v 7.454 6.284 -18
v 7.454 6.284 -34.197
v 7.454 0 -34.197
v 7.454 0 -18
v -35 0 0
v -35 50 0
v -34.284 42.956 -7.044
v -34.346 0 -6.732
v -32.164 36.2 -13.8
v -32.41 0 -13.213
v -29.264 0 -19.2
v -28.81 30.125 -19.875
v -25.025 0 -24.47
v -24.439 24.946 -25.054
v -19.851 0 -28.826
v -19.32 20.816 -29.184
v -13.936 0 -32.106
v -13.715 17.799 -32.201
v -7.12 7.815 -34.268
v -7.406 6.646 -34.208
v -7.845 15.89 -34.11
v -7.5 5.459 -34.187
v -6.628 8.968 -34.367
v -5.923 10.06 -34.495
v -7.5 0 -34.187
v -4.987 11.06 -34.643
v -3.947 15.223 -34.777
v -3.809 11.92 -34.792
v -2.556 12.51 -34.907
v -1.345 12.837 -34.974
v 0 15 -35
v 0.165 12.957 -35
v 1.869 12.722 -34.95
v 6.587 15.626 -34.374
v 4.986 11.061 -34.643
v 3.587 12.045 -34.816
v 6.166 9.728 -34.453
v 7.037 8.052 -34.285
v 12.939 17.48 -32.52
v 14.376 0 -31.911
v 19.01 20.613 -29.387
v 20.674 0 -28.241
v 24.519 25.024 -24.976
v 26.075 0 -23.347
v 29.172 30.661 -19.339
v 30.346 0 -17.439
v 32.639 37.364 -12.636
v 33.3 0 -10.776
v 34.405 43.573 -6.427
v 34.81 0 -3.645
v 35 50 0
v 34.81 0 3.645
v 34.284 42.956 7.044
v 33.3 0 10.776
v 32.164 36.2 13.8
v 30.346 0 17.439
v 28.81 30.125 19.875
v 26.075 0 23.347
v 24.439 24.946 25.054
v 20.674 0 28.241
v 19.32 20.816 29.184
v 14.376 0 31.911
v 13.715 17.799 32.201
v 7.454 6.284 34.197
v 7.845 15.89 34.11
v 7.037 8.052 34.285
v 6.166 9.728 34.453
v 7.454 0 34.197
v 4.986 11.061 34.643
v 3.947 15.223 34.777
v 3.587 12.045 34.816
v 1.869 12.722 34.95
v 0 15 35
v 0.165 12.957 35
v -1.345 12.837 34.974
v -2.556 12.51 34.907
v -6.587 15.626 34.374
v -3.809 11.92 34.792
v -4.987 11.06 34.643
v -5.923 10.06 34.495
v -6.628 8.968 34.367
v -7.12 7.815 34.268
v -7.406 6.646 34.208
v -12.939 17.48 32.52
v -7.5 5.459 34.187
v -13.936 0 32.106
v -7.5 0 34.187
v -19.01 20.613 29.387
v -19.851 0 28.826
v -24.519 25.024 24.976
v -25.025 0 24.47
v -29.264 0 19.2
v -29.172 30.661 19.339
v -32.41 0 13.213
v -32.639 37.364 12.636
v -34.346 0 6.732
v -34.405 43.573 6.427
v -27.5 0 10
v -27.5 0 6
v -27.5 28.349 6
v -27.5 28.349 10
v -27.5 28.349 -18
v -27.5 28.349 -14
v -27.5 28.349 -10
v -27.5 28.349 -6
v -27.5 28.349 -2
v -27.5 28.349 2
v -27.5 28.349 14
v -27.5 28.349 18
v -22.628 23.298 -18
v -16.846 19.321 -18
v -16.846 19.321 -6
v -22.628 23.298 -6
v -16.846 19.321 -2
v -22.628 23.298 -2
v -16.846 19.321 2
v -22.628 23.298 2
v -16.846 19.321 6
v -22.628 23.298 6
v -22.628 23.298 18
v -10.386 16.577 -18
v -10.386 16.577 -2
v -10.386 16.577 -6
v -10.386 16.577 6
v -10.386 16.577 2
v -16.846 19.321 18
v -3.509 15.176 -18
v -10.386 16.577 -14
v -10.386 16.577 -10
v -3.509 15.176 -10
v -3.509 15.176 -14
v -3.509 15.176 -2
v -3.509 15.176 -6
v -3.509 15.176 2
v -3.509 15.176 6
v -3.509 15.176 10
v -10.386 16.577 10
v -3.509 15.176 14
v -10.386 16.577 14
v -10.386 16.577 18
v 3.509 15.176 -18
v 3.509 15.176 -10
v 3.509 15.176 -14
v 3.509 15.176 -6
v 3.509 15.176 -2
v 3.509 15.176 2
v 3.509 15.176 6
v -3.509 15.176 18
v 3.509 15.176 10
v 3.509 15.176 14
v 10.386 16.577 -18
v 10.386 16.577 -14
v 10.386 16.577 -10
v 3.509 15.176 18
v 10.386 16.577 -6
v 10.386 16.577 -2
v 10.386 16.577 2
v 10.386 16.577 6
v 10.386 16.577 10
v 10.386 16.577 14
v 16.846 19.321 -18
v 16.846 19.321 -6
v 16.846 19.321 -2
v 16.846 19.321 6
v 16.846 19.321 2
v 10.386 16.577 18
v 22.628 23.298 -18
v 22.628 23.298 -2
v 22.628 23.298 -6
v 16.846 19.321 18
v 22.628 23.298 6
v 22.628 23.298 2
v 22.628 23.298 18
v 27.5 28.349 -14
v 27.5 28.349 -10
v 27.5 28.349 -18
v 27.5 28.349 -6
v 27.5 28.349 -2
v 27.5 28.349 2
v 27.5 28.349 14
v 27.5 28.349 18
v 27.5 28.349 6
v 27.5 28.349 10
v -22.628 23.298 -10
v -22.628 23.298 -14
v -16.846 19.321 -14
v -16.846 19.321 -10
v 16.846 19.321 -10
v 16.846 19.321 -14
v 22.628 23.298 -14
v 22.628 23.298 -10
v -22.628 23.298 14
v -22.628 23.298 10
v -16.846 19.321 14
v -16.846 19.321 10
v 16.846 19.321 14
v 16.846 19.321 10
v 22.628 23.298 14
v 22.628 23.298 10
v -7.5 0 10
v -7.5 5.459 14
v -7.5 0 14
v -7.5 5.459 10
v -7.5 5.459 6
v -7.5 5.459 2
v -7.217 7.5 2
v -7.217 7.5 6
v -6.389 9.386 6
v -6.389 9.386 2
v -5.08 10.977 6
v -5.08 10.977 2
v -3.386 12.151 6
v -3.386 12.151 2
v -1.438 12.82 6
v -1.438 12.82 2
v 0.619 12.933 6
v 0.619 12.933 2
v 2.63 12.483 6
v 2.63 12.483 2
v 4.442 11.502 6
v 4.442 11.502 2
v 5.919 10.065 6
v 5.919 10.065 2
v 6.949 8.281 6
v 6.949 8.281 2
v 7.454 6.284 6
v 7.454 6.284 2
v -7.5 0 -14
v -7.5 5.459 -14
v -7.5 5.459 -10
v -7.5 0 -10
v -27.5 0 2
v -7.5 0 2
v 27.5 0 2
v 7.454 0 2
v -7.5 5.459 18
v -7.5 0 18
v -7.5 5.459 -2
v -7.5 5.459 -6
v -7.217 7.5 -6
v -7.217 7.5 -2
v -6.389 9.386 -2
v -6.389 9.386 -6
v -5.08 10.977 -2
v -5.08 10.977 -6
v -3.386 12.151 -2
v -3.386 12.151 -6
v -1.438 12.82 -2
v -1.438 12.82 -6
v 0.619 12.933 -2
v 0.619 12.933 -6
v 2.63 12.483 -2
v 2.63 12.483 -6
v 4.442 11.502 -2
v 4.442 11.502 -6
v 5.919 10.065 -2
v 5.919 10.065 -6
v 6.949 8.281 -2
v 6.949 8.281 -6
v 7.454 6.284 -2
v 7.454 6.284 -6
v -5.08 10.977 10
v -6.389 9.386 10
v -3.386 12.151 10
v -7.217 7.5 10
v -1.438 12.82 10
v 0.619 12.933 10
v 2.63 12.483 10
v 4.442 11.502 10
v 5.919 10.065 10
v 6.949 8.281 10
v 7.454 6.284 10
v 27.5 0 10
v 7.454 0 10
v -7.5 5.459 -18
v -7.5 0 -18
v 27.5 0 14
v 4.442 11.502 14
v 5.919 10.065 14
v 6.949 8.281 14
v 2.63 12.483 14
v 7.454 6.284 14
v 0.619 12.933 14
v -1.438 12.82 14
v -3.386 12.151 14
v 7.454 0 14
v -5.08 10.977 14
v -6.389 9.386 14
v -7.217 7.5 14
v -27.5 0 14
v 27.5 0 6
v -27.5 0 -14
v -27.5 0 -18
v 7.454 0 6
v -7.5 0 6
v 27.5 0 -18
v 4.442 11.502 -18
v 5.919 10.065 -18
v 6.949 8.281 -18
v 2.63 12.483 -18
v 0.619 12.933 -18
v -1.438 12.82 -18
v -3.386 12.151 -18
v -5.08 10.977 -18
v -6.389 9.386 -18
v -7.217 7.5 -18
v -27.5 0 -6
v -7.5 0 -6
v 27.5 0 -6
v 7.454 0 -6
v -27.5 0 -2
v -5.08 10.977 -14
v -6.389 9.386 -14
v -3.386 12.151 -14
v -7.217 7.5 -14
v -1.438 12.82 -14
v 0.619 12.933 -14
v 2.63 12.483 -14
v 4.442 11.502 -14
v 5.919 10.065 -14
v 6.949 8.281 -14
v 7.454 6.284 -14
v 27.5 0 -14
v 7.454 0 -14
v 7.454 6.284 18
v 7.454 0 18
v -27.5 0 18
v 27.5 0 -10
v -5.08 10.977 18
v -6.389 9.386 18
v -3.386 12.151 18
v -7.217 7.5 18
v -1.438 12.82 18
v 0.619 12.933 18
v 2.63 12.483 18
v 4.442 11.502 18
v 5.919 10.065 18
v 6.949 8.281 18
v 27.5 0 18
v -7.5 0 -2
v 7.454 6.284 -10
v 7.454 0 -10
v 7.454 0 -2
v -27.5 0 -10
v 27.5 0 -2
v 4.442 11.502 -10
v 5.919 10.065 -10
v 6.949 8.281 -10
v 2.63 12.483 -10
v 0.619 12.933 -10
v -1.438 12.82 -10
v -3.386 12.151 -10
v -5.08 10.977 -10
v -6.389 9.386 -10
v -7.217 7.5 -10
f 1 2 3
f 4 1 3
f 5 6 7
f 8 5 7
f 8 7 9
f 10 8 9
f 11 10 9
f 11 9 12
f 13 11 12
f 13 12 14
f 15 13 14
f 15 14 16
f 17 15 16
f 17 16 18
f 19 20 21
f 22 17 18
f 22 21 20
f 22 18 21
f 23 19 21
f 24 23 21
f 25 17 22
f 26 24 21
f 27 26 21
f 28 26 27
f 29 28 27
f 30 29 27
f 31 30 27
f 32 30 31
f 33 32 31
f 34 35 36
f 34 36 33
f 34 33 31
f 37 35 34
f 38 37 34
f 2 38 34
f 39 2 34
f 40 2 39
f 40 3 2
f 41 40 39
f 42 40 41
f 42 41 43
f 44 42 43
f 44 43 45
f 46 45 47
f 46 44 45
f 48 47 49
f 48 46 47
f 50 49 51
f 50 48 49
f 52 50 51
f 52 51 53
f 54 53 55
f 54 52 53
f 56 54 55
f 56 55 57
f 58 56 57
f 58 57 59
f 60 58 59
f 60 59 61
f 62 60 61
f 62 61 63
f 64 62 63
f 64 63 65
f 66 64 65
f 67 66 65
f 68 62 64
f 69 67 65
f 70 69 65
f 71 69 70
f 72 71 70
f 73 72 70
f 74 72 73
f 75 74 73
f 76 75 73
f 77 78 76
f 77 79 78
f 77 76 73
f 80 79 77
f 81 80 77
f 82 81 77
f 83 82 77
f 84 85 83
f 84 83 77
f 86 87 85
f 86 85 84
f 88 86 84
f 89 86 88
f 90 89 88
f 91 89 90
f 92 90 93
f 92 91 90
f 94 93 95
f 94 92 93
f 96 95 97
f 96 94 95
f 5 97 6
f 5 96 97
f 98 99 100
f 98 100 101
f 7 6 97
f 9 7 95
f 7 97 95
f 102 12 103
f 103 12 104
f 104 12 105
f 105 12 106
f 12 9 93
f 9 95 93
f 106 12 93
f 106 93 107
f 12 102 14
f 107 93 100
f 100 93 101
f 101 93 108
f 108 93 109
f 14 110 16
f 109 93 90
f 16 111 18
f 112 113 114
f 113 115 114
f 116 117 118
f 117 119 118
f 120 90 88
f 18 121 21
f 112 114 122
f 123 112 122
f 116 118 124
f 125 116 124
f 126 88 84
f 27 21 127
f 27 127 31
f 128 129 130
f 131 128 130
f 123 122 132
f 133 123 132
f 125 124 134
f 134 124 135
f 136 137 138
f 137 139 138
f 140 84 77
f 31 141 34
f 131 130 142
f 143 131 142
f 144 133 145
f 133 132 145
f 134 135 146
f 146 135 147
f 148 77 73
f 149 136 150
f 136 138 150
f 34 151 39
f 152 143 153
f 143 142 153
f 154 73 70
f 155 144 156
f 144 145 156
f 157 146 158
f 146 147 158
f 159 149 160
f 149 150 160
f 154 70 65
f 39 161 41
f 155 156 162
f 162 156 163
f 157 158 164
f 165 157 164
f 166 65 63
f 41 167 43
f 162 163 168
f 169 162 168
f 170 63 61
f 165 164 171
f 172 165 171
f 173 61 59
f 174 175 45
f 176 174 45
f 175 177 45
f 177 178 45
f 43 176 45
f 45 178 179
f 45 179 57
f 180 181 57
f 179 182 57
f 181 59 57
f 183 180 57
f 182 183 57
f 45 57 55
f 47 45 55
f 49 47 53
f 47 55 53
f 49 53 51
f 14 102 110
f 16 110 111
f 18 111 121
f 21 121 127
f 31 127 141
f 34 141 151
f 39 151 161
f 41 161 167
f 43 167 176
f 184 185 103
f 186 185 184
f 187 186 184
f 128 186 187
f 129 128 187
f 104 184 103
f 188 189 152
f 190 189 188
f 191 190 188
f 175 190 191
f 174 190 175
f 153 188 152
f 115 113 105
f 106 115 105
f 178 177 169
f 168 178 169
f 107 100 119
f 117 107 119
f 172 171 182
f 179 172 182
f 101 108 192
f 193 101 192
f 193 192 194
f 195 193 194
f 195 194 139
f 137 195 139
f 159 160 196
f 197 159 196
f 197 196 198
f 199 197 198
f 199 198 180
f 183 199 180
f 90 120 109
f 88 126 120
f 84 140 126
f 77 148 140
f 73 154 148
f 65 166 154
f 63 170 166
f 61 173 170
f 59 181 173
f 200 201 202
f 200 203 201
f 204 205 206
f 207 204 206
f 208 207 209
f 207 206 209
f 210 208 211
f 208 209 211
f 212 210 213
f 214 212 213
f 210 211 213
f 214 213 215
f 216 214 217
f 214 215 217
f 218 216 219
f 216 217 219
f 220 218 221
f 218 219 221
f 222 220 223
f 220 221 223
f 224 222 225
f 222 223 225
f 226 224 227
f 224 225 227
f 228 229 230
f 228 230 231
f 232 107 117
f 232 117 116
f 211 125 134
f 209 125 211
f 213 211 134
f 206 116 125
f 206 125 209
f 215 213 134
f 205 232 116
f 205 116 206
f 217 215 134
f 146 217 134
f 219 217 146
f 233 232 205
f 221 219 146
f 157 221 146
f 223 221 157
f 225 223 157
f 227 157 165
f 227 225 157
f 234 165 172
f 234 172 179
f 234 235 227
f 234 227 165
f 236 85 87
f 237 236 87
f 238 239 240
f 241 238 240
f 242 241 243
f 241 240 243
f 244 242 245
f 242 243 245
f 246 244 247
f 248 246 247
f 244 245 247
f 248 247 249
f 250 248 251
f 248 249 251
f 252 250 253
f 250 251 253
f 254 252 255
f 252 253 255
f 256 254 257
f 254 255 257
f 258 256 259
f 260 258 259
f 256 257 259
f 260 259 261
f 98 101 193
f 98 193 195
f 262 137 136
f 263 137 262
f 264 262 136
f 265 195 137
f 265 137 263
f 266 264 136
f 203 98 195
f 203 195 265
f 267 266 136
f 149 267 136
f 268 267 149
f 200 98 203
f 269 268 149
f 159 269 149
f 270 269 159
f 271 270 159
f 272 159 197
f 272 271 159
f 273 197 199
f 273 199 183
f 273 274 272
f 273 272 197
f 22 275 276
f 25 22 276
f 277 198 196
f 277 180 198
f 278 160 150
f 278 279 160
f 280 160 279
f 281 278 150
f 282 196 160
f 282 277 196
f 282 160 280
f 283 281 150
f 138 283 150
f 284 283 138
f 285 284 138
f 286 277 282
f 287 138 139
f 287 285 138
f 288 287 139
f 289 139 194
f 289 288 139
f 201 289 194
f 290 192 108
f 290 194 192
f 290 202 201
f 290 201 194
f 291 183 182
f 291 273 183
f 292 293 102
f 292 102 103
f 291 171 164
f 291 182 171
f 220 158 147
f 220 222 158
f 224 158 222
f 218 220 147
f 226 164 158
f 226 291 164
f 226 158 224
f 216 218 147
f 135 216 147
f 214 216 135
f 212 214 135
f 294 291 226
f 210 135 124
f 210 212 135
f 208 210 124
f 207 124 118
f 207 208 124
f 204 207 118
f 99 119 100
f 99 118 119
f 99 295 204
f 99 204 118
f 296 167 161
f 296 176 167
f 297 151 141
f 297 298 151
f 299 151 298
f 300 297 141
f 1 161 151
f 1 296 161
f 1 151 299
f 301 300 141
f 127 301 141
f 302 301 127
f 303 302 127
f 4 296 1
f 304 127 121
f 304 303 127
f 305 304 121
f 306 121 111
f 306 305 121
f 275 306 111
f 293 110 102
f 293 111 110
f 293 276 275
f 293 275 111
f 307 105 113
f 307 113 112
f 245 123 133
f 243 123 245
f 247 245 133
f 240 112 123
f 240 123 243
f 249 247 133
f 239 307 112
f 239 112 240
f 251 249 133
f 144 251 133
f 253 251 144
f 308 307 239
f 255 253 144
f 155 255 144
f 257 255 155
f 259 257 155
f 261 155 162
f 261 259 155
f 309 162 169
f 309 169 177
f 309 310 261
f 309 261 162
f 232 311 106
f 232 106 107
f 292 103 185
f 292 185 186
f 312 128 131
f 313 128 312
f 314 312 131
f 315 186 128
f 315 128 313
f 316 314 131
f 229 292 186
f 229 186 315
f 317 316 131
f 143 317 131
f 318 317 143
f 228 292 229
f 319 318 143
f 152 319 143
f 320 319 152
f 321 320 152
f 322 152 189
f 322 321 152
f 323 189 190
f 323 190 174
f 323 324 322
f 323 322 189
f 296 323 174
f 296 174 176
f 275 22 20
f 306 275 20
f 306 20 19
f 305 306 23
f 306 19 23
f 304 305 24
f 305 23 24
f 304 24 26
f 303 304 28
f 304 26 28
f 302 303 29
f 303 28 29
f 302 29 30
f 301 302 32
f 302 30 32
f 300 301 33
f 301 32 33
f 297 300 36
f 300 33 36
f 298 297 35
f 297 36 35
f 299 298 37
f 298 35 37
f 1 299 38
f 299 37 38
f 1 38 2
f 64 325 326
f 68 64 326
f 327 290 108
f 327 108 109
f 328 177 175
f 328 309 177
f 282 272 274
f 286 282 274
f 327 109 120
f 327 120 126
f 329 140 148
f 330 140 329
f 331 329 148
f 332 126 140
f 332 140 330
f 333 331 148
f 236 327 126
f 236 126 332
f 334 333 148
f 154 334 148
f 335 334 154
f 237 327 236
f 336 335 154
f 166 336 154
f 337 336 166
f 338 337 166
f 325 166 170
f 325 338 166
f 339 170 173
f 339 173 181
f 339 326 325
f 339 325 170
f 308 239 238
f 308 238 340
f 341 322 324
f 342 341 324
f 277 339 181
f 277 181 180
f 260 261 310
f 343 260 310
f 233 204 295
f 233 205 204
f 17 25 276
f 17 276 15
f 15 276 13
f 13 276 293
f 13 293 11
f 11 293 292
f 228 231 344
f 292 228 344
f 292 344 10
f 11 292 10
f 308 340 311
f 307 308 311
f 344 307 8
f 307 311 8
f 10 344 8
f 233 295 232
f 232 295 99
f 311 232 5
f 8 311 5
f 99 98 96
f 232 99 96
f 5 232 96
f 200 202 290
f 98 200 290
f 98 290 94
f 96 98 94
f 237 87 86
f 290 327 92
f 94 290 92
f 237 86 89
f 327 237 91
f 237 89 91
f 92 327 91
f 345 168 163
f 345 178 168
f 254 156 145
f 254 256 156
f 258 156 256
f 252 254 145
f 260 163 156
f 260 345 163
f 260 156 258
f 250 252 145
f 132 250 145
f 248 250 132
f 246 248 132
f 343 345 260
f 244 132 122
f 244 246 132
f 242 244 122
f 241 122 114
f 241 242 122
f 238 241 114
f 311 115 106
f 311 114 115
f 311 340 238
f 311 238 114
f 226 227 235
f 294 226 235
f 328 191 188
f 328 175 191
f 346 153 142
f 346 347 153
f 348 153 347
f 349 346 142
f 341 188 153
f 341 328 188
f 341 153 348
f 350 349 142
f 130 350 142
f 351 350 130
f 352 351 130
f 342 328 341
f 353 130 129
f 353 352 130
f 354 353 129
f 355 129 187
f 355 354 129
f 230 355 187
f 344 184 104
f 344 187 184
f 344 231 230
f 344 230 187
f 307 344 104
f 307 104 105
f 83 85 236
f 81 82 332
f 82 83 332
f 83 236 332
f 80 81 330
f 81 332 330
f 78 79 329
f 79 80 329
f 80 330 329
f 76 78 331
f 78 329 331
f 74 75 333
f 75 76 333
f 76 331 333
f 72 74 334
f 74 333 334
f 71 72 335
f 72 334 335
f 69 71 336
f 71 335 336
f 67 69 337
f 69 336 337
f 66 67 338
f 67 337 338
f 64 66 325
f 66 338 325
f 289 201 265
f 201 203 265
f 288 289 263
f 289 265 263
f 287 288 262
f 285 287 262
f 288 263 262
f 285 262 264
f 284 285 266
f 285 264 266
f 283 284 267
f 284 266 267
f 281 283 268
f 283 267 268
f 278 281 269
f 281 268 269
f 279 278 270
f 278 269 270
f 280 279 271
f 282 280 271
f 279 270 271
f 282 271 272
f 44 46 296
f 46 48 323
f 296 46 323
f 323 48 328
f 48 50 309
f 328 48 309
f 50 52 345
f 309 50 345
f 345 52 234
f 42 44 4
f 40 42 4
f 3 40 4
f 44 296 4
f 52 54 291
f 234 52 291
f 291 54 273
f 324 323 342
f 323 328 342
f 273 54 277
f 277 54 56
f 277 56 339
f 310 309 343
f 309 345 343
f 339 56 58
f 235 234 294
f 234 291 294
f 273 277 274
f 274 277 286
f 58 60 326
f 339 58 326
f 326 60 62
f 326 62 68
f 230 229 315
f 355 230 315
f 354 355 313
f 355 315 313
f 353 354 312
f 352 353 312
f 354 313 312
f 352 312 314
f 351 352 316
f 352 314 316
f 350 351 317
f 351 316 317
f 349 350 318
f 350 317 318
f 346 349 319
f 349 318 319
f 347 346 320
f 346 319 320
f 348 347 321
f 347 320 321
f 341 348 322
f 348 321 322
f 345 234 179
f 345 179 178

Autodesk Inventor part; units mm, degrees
ref_plane "YZ Plane" through (0, 0, 0) normal (1, 0, 0) x (0, 1, 0)
sketch "Sketch1" plane through (0, 0, 0) normal (0, 1, 0) x (-1, 0, 0)
  circle A0 centre (0, 0) radius 35
  dimension "d0" = 70
extrude "Extrusion1" add sketch "Sketch1" along normal blind 50
sketch "Sketch2" plane through (0, 0, 0) normal (1, 0, 0) x (0, 1, 0)
  point P0 (0, 0)
sketch "Sketch3" plane through (0, 0, 0) normal (0, 0, 1) x (1, 0, 0)
  line L0 (35, 50) -> (-35, 50) projected
  arc A0 (-35, 50) -> (35, 50) centre (0, 50) ccw
  point P0 (0, 0)
  dimension "d3" = 35
extrude "Extrusion2" cut sketch "Sketch3" against normal blind 50 and the other way blind 50
sketch "Sketch4" plane through (0, 0, 0) normal (0, 0, 1) x (1, 0, 0)
  arc A0 (7.4545, 6.2837) -> (-7.5, 5.4589) centre (0, 5.4589) ccw
  line L0 (7.4545, 6.2837) -> (7.4545, 0)
  line L1 (-35, 0) -> (35, 0) projected
  line L2 (-7.5, 5.4589) -> (-7.5, 0)
  line L3 (-7.5, 0) -> (7.4545, 0)
  line L4 (7.4545, 0) -> (3.6133, 0)
  line L5 (3.6133, 0) -> (-3.6133, 0)
  line L6 (-3.6133, 0) -> (-7.5, 0)
  point P0 (0, 0)
  dimension "d8" = 15
extrude "Extrusion3" cut sketch "Sketch4" along normal blind 50 and the other way blind 50
sketch "Sketch5" plane through (0, 0, 0) normal (0, 1, 0) x (-1, 0, 0)
  point P0 (0, 0)
sketch "Sketch6" plane through (0, 0, 0) normal (0, 1, 0) x (-1, 0, 0)
  line L0 (-27.5, -2) -> (27.5, -2)
  line L1 (27.5, -2) -> (27.5, 2)
  line L2 (27.5, 2) -> (-27.5, 2)
  line L3 (-27.5, 2) -> (-27.5, -2)
  line L4 (-27.5, -2) -> (27.5, 2) construction
  line L5 (27.5, -2) -> (-27.5, 2) construction
  line L6 (27.5, -6) -> (-27.5, -6)
  line L7 (-27.5, -6) -> (-27.5, -10)
  line L8 (-27.5, -10) -> (27.5, -10)
  line L9 (27.5, -10) -> (27.5, -6)
  line L10 (27.5, -14) -> (-27.5, -14)
  line L11 (-27.5, -14) -> (-27.5, -18)
  line L12 (-27.5, -18) -> (27.5, -18)
  line L13 (27.5, -18) -> (27.5, -14)
  line L14 (27.5, 10) -> (-27.5, 10)
  line L15 (-27.5, 10) -> (-27.5, 6)
  line L16 (-27.5, 6) -> (27.5, 6)
  line L17 (27.5, 6) -> (27.5, 10)
  line L18 (27.5, 2) -> (-27.5, 2)
  line L19 (-27.5, 2) -> (-27.5, -2)
  line L20 (-27.5, -2) -> (27.5, -2)
  line L21 (27.5, -2) -> (27.5, 2)
  line L22 (27.5, -6) -> (-27.5, -6)
  line L23 (-27.5, -6) -> (-27.5, -10)
  line L24 (-27.5, -10) -> (27.5, -10)
  line L25 (27.5, -10) -> (27.5, -6)
  line L26 (27.5, 18) -> (-27.5, 18)
  line L27 (-27.5, 18) -> (-27.5, 14)
  line L28 (-27.5, 14) -> (27.5, 14)
  line L29 (27.5, 14) -> (27.5, 18)
  line L30 (27.5, 10) -> (-27.5, 10)
  line L31 (-27.5, 10) -> (-27.5, 6)
  line L32 (-27.5, 6) -> (27.5, 6)
  line L33 (27.5, 6) -> (27.5, 10)
  line L34 (27.5, 2) -> (-27.5, 2)
  line L35 (-27.5, 2) -> (-27.5, -2)
  line L36 (-27.5, -2) -> (27.5, -2)
  line L37 (27.5, -2) -> (27.5, 2)
  point P0 (0, 0)
  dimension "d13" = 55
  dimension "d14" = 4
  dimension "d17" = 8
  dimension "d20" = 8
extrude "Extrusion4" cut sketch "Sketch6" along normal blind 50
properties part number "pipe_insert"
